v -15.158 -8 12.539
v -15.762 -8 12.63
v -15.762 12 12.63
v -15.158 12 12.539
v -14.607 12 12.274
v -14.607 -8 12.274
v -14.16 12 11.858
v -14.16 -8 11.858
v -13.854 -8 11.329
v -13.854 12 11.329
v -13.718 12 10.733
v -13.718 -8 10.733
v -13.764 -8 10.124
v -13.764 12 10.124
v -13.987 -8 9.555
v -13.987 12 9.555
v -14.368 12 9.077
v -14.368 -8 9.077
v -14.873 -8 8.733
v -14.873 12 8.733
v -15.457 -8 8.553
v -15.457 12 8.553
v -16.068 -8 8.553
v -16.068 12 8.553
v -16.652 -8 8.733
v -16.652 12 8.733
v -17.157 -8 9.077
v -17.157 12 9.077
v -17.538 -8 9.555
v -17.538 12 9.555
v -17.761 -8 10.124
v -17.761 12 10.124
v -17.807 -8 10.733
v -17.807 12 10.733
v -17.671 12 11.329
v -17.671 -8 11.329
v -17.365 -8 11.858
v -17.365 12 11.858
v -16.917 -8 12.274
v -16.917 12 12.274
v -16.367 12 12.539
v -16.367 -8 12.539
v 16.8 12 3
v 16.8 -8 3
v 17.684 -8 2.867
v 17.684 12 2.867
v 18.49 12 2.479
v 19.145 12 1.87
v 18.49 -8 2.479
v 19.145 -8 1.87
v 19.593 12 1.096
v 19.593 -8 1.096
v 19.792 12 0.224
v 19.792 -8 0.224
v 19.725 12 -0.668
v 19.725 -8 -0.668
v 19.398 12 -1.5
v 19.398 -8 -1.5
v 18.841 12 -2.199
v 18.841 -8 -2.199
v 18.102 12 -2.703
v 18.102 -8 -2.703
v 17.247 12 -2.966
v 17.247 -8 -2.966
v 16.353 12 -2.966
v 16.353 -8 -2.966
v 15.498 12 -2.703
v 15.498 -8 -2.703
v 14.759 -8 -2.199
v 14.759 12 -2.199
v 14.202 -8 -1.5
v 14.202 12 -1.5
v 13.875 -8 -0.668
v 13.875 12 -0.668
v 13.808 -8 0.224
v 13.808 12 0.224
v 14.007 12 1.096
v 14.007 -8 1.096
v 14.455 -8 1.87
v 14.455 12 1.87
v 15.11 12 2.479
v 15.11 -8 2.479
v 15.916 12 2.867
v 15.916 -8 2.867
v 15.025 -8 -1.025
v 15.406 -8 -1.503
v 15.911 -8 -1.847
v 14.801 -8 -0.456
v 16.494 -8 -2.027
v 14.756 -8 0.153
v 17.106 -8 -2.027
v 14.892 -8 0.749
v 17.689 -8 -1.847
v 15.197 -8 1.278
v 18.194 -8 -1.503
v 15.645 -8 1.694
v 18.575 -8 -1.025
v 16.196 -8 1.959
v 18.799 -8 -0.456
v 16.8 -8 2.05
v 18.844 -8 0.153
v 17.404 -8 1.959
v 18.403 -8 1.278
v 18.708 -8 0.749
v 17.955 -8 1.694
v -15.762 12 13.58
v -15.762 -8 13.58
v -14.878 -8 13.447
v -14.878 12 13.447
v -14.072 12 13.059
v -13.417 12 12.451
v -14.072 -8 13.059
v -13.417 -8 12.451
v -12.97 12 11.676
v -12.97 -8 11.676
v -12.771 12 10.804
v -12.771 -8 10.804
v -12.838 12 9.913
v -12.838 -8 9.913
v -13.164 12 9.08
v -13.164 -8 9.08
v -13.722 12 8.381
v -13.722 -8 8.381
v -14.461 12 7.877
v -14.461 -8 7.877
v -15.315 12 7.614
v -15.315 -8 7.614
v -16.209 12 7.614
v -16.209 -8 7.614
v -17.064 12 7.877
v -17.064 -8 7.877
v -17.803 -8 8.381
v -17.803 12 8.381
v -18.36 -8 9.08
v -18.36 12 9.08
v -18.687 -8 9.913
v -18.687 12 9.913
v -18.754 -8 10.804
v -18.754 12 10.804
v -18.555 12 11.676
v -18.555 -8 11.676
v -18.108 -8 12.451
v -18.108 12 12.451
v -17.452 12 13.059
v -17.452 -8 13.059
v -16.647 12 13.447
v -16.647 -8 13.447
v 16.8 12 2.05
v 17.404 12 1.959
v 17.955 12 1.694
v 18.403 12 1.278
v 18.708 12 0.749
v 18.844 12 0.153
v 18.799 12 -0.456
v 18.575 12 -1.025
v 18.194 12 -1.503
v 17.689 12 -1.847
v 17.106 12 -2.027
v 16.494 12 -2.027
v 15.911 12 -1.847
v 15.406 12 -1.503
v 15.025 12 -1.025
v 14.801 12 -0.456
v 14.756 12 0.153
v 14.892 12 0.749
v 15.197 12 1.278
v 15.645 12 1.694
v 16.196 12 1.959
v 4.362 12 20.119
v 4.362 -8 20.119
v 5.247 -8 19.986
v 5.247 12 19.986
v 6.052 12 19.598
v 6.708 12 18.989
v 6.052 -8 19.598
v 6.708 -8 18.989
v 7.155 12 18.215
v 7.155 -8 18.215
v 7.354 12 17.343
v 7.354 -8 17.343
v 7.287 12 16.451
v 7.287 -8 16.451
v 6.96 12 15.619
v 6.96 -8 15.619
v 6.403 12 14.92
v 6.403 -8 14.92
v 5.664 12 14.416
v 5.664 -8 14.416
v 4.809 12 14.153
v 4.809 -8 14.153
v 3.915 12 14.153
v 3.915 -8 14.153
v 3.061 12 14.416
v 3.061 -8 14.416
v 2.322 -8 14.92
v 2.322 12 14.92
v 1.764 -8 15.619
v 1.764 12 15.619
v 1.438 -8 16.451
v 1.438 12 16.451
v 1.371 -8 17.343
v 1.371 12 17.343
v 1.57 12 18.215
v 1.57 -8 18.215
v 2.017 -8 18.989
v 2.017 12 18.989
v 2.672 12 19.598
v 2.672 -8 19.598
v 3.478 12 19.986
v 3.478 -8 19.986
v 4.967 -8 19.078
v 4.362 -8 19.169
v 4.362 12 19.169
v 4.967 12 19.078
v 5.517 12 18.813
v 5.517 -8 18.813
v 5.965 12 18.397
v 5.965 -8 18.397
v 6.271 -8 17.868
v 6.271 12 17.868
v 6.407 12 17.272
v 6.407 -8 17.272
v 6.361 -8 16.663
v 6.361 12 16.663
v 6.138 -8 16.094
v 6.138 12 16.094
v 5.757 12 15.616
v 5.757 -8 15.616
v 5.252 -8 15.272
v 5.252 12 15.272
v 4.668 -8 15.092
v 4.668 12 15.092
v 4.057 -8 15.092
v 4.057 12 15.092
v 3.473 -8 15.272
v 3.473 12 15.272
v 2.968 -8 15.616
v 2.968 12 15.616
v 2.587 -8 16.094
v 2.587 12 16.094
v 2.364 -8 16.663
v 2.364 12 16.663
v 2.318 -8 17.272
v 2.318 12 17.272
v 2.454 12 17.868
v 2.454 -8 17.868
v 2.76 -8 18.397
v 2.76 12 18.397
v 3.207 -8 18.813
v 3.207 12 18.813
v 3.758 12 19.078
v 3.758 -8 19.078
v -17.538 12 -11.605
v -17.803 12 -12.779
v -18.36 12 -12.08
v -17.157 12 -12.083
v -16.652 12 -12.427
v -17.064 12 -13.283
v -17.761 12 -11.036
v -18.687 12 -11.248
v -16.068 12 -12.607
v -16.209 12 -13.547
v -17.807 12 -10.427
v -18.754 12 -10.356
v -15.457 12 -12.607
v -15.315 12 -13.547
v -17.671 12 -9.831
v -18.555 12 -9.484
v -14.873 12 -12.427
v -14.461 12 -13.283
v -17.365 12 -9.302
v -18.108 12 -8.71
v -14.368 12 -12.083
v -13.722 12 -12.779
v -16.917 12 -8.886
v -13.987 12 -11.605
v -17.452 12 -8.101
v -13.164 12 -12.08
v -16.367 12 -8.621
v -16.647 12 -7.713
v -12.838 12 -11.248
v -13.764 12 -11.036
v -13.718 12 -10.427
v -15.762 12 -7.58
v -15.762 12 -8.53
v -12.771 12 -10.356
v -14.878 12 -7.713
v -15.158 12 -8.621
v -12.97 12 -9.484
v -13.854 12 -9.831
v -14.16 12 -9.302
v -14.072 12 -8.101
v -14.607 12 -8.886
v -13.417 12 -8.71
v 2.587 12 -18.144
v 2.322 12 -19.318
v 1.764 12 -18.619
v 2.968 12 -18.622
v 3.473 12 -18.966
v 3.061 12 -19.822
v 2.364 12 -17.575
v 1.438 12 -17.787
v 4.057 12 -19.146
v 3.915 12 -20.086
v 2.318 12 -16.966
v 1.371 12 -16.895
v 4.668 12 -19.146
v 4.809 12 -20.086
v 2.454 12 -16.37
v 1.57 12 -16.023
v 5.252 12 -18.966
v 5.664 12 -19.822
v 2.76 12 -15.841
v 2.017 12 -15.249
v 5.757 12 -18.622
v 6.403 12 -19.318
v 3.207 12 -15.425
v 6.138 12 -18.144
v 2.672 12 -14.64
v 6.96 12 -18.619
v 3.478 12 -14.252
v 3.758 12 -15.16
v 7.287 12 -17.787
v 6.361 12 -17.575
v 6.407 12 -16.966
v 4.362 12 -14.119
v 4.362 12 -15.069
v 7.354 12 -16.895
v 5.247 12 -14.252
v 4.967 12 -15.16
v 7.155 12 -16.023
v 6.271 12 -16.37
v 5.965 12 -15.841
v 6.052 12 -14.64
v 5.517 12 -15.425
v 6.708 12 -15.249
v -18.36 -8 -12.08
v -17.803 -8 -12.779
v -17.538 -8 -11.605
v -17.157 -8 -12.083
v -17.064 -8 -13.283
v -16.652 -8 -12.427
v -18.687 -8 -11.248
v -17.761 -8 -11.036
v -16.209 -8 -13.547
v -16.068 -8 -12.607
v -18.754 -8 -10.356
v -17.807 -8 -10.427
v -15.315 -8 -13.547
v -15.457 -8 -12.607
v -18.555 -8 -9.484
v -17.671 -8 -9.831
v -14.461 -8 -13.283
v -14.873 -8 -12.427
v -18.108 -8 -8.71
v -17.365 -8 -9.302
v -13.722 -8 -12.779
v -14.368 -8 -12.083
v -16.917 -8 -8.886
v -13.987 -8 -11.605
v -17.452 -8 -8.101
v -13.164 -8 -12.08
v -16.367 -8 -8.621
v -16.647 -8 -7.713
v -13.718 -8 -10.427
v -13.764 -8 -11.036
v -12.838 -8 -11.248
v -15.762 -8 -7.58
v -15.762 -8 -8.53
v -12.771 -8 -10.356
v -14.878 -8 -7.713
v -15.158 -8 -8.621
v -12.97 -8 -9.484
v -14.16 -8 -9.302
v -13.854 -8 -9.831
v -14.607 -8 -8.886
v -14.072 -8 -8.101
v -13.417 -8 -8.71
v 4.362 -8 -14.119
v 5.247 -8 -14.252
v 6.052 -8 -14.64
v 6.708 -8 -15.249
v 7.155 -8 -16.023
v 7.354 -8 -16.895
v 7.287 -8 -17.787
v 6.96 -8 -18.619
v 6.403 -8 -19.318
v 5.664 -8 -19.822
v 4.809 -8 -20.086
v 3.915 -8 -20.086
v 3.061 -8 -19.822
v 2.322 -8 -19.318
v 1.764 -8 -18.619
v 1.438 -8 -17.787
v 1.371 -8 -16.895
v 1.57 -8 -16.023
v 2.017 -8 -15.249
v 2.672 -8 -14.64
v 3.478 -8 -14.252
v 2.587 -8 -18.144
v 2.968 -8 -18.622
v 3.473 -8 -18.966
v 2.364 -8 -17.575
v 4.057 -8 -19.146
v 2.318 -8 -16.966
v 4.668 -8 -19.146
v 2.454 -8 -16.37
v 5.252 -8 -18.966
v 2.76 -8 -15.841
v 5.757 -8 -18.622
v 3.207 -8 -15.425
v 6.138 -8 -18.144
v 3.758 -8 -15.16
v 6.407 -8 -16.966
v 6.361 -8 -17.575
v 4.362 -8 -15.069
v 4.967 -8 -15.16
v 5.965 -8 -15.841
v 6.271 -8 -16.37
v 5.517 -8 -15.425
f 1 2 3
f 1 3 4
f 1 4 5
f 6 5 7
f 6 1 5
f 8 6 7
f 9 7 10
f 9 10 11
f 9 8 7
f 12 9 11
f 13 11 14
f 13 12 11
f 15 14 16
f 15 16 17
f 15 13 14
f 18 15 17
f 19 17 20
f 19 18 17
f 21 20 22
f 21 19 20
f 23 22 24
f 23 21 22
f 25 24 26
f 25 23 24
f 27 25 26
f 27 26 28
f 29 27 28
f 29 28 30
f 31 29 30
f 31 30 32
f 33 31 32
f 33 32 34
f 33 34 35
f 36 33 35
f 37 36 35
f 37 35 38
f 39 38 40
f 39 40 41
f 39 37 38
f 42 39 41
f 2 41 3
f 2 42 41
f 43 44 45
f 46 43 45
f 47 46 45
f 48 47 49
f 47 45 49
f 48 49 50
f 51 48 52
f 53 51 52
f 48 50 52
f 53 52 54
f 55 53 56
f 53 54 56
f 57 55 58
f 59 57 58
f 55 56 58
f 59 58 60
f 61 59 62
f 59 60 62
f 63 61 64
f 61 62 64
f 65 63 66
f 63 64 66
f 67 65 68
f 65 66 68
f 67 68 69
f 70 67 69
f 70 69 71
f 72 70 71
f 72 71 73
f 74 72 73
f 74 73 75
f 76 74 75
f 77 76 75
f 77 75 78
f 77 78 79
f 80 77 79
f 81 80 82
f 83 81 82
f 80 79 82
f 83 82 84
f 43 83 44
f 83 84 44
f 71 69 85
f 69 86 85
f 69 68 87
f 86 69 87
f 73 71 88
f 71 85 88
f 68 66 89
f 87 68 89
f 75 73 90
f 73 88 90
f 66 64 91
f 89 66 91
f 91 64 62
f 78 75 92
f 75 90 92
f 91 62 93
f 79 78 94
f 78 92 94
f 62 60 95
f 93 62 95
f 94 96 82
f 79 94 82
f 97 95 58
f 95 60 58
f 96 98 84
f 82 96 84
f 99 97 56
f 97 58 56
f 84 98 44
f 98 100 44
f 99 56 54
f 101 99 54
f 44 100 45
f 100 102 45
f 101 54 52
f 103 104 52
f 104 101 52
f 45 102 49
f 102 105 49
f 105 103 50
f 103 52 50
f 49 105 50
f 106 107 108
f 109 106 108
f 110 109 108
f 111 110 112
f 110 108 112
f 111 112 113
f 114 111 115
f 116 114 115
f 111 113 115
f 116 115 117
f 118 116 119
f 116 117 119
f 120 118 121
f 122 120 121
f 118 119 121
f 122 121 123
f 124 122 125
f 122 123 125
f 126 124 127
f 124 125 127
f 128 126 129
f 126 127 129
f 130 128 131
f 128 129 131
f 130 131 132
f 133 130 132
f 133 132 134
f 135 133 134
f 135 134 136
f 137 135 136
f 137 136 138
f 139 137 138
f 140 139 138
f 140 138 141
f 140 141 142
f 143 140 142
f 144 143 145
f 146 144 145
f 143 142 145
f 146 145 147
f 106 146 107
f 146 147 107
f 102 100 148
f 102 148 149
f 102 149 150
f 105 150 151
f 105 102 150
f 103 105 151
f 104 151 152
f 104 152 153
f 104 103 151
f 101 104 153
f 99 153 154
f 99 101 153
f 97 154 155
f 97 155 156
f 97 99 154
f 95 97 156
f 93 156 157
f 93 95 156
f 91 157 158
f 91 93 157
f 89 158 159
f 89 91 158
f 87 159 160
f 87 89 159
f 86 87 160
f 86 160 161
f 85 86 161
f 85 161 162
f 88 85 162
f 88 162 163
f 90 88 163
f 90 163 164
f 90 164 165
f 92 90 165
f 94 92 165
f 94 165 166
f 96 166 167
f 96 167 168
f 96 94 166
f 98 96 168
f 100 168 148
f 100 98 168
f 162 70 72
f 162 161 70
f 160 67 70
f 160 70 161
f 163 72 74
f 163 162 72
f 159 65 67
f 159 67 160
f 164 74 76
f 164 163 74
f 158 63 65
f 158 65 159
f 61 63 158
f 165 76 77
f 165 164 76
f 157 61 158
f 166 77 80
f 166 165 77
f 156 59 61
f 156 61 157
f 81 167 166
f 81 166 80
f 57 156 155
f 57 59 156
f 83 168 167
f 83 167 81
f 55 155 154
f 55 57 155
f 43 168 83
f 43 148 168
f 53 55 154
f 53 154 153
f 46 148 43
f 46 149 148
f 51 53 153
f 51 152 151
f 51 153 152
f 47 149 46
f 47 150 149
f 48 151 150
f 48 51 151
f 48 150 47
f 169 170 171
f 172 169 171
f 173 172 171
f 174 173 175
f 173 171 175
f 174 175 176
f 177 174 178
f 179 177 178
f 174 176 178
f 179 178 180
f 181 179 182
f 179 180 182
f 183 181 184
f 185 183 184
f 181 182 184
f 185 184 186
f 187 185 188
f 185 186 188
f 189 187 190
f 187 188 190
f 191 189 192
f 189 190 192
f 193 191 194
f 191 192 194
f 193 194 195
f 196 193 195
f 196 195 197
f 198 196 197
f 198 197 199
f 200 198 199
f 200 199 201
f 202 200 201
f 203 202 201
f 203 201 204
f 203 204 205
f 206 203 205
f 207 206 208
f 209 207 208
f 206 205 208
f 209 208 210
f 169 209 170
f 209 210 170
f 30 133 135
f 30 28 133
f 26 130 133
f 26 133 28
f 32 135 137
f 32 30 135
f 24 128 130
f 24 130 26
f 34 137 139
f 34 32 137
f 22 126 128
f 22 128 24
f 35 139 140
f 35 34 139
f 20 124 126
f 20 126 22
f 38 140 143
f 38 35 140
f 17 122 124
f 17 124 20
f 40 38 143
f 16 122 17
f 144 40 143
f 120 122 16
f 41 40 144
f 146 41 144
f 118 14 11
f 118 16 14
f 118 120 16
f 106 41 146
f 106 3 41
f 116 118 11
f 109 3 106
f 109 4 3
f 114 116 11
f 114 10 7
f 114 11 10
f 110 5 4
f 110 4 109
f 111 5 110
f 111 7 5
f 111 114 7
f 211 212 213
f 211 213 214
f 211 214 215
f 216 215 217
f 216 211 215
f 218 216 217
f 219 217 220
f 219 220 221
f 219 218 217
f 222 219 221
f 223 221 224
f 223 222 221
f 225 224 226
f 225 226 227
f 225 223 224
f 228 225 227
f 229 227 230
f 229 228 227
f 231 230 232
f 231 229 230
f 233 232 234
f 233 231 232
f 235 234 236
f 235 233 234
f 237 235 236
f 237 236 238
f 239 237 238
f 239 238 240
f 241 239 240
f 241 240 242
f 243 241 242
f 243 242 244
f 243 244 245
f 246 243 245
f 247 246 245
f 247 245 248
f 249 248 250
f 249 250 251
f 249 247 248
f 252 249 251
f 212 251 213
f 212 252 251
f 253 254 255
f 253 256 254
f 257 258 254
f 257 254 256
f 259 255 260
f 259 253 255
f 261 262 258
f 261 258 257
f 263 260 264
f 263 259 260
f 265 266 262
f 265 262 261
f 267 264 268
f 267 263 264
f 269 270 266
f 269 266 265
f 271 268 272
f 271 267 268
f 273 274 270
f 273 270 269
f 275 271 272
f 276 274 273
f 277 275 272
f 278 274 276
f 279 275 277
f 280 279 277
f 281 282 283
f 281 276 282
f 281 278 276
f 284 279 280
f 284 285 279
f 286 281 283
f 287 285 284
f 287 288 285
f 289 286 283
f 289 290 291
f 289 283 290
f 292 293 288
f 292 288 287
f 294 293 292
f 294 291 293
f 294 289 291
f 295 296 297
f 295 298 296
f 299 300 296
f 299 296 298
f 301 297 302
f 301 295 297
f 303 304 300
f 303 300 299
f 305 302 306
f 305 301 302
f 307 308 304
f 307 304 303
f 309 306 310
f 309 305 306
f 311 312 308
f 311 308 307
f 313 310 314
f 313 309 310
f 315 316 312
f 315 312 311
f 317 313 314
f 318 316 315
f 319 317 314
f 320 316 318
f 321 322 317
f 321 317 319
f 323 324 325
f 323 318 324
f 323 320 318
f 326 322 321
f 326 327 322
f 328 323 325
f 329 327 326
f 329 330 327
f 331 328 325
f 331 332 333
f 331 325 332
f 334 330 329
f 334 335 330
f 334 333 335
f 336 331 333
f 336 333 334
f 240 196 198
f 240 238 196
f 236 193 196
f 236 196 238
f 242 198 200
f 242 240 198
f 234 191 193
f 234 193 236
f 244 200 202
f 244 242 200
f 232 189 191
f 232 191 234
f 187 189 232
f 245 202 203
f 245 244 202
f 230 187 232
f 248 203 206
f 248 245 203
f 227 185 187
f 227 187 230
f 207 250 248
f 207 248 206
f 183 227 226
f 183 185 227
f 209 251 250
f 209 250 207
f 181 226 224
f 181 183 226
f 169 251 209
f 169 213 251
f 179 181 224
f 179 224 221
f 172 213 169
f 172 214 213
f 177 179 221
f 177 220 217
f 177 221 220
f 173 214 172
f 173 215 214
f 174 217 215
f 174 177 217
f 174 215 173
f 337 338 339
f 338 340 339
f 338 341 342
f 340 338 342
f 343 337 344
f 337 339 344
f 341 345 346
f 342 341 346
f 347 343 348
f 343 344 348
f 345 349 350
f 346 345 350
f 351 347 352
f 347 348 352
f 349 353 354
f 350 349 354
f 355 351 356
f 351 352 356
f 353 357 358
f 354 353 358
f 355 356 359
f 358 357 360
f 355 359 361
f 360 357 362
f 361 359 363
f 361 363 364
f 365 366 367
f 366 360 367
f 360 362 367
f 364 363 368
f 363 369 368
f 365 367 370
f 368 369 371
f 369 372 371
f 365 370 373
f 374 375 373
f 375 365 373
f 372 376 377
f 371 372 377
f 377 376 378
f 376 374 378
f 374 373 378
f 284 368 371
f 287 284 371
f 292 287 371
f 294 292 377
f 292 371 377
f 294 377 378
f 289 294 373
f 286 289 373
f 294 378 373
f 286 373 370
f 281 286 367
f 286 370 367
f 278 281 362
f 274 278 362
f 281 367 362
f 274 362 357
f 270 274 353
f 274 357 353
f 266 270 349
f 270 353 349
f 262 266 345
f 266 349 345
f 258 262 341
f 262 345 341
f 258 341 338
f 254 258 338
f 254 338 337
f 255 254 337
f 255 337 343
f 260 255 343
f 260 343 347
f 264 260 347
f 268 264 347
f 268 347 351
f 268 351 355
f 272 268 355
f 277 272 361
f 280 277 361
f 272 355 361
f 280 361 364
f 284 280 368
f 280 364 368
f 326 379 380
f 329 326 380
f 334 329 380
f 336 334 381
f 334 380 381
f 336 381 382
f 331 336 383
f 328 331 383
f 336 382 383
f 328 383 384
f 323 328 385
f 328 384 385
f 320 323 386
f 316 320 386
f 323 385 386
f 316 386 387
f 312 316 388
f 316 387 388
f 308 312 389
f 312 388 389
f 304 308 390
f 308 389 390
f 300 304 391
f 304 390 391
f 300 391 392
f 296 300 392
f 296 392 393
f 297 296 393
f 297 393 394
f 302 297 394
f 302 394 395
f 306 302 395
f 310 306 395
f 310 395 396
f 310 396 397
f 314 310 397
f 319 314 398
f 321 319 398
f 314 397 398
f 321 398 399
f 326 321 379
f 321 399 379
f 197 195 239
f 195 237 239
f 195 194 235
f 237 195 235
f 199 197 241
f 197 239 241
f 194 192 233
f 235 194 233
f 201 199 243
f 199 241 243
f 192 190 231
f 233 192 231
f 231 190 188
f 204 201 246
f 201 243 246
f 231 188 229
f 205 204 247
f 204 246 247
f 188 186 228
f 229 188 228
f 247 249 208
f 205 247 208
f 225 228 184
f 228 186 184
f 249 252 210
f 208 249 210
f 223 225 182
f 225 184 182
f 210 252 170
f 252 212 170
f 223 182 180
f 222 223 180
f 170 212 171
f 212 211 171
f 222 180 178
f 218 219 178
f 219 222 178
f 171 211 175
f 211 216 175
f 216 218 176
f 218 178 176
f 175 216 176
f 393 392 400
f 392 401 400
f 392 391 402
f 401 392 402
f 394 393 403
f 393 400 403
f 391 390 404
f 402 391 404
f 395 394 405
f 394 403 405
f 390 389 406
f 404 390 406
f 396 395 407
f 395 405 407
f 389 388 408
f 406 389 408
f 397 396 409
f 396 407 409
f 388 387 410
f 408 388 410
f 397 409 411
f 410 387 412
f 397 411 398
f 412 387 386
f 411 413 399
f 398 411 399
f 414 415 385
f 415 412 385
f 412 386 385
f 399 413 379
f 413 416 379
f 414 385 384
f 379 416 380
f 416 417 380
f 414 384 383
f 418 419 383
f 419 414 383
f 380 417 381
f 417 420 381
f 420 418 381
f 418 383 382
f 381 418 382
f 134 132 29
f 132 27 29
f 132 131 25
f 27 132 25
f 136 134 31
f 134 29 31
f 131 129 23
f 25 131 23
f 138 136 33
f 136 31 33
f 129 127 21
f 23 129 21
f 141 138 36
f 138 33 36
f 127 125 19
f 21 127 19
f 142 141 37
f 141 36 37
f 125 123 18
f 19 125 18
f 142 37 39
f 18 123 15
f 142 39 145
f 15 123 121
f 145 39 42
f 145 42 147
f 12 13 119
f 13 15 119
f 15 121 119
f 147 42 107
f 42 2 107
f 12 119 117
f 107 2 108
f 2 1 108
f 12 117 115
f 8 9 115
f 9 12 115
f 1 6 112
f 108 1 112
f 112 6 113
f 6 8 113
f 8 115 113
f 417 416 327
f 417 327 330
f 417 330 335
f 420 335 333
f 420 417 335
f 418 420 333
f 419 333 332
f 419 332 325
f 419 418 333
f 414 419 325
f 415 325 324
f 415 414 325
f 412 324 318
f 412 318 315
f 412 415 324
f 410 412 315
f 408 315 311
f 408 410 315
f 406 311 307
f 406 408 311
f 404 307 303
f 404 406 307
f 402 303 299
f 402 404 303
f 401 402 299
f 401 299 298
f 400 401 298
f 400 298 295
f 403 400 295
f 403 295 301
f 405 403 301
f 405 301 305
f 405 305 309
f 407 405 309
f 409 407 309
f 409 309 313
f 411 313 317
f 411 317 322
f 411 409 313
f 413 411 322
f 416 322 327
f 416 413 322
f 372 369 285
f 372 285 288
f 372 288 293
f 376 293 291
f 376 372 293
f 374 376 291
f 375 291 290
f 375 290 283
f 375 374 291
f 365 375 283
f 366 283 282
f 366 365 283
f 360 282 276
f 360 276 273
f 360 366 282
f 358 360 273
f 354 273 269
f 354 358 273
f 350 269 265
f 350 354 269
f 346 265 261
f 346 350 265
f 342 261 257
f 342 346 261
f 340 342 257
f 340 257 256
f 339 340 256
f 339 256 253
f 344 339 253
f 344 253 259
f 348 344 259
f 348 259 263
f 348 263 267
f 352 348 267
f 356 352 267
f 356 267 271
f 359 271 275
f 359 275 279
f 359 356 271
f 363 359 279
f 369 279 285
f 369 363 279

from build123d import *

# Parameters (mm, degrees)
BOSS_EXTRUDE1_DEPTH        = 12
BOSS_EXTRUDE1_DEPTH_BACK   = 8
SKETCH1_R                  = 3
SKETCH1_R_2                = 2.05
BOSS_EXTRUDE1_2_DEPTH      = 12
BOSS_EXTRUDE1_2_DEPTH_BACK = 8
BOSS_EXTRUDE1_3_DEPTH      = 12
BOSS_EXTRUDE1_3_DEPTH_BACK = 8
BOSS_EXTRUDE1_4_DEPTH      = 12
BOSS_EXTRUDE1_4_DEPTH_BACK = 8
BOSS_EXTRUDE1_5_DEPTH      = 12
BOSS_EXTRUDE1_5_DEPTH_BACK = 8


with BuildPart() as part:
    # Sketch1 → Boss-Extrude1 (new, two sides: drawn at the far end of the back side and taken through both)
    with BuildSketch(Plane(origin=(0, 0, 0), x_dir=(1, 0, 0), z_dir=(0, 1, 0)).offset(-BOSS_EXTRUDE1_DEPTH_BACK)):
        with Locations(Location((-15.762305899, -10.580134541, 0), (0, 0, 270))):
            Circle(SKETCH1_R)
        with Locations(Location((-15.762305899, -10.580134541, 0), (0, 0, 270))):
            Circle(SKETCH1_R_2, mode=Mode.SUBTRACT)
    extrude(amount=BOSS_EXTRUDE1_DEPTH + BOSS_EXTRUDE1_DEPTH_BACK)


with BuildPart() as body_2:
    # Sketch1 → Boss-Extrude1 2 (new, two sides: drawn at the far end of the back side and taken through both)
    with BuildSketch(Plane(origin=(0, 0, 0), x_dir=(1, 0, 0), z_dir=(0, 1, 0)).offset(-BOSS_EXTRUDE1_2_DEPTH_BACK)):
        with Locations(Location((4.362305899, -17.119017293, 0), (0, 0, 270))):
            Circle(SKETCH1_R)
        with Locations(Location((4.362305899, -17.119017293, 0), (0, 0, 270))):
            Circle(SKETCH1_R_2, mode=Mode.SUBTRACT)
    extrude(amount=BOSS_EXTRUDE1_2_DEPTH + BOSS_EXTRUDE1_2_DEPTH_BACK)


with BuildPart() as body_3:
    # Sketch1 → Boss-Extrude1 3 (new, two sides: drawn at the far end of the back side and taken through both)
    with BuildSketch(Plane(origin=(0, 0, 0), x_dir=(1, 0, 0), z_dir=(0, 1, 0)).offset(-BOSS_EXTRUDE1_3_DEPTH_BACK)):
        with Locations(Location((16.8, 0, 0), (0, 0, 270))):
            Circle(SKETCH1_R)
        with Locations(Location((16.8, 0, 0), (0, 0, 270))):
            Circle(SKETCH1_R_2, mode=Mode.SUBTRACT)
    extrude(amount=BOSS_EXTRUDE1_3_DEPTH + BOSS_EXTRUDE1_3_DEPTH_BACK)


with BuildPart() as body_4:
    # Sketch1 → Boss-Extrude1 4 (new, two sides: drawn at the far end of the back side and taken through both)
    with BuildSketch(Plane(origin=(0, 0, 0), x_dir=(1, 0, 0), z_dir=(0, 1, 0)).offset(-BOSS_EXTRUDE1_4_DEPTH_BACK)):
        with Locations(Location((-15.762305899, 10.580134541, 0), (0, 0, 270))):
            Circle(SKETCH1_R)
        with Locations(Location((-15.762305899, 10.580134541, 0), (0, 0, 270))):
            Circle(SKETCH1_R_2, mode=Mode.SUBTRACT)
    extrude(amount=BOSS_EXTRUDE1_4_DEPTH + BOSS_EXTRUDE1_4_DEPTH_BACK)


with BuildPart() as body_5:
    # Sketch1 → Boss-Extrude1 5 (new, two sides: drawn at the far end of the back side and taken through both)
    with BuildSketch(Plane(origin=(0, 0, 0), x_dir=(1, 0, 0), z_dir=(0, 1, 0)).offset(-BOSS_EXTRUDE1_5_DEPTH_BACK)):
        with Locations(Location((4.362305899, 17.119017293, 0), (0, 0, 270))):
            Circle(SKETCH1_R)
        with Locations(Location((4.362305899, 17.119017293, 0), (0, 0, 270))):
            Circle(SKETCH1_R_2, mode=Mode.SUBTRACT)
    extrude(amount=BOSS_EXTRUDE1_5_DEPTH + BOSS_EXTRUDE1_5_DEPTH_BACK)


solid = Compound([part.part, body_2.part, body_3.part, body_4.part, body_5.part])
